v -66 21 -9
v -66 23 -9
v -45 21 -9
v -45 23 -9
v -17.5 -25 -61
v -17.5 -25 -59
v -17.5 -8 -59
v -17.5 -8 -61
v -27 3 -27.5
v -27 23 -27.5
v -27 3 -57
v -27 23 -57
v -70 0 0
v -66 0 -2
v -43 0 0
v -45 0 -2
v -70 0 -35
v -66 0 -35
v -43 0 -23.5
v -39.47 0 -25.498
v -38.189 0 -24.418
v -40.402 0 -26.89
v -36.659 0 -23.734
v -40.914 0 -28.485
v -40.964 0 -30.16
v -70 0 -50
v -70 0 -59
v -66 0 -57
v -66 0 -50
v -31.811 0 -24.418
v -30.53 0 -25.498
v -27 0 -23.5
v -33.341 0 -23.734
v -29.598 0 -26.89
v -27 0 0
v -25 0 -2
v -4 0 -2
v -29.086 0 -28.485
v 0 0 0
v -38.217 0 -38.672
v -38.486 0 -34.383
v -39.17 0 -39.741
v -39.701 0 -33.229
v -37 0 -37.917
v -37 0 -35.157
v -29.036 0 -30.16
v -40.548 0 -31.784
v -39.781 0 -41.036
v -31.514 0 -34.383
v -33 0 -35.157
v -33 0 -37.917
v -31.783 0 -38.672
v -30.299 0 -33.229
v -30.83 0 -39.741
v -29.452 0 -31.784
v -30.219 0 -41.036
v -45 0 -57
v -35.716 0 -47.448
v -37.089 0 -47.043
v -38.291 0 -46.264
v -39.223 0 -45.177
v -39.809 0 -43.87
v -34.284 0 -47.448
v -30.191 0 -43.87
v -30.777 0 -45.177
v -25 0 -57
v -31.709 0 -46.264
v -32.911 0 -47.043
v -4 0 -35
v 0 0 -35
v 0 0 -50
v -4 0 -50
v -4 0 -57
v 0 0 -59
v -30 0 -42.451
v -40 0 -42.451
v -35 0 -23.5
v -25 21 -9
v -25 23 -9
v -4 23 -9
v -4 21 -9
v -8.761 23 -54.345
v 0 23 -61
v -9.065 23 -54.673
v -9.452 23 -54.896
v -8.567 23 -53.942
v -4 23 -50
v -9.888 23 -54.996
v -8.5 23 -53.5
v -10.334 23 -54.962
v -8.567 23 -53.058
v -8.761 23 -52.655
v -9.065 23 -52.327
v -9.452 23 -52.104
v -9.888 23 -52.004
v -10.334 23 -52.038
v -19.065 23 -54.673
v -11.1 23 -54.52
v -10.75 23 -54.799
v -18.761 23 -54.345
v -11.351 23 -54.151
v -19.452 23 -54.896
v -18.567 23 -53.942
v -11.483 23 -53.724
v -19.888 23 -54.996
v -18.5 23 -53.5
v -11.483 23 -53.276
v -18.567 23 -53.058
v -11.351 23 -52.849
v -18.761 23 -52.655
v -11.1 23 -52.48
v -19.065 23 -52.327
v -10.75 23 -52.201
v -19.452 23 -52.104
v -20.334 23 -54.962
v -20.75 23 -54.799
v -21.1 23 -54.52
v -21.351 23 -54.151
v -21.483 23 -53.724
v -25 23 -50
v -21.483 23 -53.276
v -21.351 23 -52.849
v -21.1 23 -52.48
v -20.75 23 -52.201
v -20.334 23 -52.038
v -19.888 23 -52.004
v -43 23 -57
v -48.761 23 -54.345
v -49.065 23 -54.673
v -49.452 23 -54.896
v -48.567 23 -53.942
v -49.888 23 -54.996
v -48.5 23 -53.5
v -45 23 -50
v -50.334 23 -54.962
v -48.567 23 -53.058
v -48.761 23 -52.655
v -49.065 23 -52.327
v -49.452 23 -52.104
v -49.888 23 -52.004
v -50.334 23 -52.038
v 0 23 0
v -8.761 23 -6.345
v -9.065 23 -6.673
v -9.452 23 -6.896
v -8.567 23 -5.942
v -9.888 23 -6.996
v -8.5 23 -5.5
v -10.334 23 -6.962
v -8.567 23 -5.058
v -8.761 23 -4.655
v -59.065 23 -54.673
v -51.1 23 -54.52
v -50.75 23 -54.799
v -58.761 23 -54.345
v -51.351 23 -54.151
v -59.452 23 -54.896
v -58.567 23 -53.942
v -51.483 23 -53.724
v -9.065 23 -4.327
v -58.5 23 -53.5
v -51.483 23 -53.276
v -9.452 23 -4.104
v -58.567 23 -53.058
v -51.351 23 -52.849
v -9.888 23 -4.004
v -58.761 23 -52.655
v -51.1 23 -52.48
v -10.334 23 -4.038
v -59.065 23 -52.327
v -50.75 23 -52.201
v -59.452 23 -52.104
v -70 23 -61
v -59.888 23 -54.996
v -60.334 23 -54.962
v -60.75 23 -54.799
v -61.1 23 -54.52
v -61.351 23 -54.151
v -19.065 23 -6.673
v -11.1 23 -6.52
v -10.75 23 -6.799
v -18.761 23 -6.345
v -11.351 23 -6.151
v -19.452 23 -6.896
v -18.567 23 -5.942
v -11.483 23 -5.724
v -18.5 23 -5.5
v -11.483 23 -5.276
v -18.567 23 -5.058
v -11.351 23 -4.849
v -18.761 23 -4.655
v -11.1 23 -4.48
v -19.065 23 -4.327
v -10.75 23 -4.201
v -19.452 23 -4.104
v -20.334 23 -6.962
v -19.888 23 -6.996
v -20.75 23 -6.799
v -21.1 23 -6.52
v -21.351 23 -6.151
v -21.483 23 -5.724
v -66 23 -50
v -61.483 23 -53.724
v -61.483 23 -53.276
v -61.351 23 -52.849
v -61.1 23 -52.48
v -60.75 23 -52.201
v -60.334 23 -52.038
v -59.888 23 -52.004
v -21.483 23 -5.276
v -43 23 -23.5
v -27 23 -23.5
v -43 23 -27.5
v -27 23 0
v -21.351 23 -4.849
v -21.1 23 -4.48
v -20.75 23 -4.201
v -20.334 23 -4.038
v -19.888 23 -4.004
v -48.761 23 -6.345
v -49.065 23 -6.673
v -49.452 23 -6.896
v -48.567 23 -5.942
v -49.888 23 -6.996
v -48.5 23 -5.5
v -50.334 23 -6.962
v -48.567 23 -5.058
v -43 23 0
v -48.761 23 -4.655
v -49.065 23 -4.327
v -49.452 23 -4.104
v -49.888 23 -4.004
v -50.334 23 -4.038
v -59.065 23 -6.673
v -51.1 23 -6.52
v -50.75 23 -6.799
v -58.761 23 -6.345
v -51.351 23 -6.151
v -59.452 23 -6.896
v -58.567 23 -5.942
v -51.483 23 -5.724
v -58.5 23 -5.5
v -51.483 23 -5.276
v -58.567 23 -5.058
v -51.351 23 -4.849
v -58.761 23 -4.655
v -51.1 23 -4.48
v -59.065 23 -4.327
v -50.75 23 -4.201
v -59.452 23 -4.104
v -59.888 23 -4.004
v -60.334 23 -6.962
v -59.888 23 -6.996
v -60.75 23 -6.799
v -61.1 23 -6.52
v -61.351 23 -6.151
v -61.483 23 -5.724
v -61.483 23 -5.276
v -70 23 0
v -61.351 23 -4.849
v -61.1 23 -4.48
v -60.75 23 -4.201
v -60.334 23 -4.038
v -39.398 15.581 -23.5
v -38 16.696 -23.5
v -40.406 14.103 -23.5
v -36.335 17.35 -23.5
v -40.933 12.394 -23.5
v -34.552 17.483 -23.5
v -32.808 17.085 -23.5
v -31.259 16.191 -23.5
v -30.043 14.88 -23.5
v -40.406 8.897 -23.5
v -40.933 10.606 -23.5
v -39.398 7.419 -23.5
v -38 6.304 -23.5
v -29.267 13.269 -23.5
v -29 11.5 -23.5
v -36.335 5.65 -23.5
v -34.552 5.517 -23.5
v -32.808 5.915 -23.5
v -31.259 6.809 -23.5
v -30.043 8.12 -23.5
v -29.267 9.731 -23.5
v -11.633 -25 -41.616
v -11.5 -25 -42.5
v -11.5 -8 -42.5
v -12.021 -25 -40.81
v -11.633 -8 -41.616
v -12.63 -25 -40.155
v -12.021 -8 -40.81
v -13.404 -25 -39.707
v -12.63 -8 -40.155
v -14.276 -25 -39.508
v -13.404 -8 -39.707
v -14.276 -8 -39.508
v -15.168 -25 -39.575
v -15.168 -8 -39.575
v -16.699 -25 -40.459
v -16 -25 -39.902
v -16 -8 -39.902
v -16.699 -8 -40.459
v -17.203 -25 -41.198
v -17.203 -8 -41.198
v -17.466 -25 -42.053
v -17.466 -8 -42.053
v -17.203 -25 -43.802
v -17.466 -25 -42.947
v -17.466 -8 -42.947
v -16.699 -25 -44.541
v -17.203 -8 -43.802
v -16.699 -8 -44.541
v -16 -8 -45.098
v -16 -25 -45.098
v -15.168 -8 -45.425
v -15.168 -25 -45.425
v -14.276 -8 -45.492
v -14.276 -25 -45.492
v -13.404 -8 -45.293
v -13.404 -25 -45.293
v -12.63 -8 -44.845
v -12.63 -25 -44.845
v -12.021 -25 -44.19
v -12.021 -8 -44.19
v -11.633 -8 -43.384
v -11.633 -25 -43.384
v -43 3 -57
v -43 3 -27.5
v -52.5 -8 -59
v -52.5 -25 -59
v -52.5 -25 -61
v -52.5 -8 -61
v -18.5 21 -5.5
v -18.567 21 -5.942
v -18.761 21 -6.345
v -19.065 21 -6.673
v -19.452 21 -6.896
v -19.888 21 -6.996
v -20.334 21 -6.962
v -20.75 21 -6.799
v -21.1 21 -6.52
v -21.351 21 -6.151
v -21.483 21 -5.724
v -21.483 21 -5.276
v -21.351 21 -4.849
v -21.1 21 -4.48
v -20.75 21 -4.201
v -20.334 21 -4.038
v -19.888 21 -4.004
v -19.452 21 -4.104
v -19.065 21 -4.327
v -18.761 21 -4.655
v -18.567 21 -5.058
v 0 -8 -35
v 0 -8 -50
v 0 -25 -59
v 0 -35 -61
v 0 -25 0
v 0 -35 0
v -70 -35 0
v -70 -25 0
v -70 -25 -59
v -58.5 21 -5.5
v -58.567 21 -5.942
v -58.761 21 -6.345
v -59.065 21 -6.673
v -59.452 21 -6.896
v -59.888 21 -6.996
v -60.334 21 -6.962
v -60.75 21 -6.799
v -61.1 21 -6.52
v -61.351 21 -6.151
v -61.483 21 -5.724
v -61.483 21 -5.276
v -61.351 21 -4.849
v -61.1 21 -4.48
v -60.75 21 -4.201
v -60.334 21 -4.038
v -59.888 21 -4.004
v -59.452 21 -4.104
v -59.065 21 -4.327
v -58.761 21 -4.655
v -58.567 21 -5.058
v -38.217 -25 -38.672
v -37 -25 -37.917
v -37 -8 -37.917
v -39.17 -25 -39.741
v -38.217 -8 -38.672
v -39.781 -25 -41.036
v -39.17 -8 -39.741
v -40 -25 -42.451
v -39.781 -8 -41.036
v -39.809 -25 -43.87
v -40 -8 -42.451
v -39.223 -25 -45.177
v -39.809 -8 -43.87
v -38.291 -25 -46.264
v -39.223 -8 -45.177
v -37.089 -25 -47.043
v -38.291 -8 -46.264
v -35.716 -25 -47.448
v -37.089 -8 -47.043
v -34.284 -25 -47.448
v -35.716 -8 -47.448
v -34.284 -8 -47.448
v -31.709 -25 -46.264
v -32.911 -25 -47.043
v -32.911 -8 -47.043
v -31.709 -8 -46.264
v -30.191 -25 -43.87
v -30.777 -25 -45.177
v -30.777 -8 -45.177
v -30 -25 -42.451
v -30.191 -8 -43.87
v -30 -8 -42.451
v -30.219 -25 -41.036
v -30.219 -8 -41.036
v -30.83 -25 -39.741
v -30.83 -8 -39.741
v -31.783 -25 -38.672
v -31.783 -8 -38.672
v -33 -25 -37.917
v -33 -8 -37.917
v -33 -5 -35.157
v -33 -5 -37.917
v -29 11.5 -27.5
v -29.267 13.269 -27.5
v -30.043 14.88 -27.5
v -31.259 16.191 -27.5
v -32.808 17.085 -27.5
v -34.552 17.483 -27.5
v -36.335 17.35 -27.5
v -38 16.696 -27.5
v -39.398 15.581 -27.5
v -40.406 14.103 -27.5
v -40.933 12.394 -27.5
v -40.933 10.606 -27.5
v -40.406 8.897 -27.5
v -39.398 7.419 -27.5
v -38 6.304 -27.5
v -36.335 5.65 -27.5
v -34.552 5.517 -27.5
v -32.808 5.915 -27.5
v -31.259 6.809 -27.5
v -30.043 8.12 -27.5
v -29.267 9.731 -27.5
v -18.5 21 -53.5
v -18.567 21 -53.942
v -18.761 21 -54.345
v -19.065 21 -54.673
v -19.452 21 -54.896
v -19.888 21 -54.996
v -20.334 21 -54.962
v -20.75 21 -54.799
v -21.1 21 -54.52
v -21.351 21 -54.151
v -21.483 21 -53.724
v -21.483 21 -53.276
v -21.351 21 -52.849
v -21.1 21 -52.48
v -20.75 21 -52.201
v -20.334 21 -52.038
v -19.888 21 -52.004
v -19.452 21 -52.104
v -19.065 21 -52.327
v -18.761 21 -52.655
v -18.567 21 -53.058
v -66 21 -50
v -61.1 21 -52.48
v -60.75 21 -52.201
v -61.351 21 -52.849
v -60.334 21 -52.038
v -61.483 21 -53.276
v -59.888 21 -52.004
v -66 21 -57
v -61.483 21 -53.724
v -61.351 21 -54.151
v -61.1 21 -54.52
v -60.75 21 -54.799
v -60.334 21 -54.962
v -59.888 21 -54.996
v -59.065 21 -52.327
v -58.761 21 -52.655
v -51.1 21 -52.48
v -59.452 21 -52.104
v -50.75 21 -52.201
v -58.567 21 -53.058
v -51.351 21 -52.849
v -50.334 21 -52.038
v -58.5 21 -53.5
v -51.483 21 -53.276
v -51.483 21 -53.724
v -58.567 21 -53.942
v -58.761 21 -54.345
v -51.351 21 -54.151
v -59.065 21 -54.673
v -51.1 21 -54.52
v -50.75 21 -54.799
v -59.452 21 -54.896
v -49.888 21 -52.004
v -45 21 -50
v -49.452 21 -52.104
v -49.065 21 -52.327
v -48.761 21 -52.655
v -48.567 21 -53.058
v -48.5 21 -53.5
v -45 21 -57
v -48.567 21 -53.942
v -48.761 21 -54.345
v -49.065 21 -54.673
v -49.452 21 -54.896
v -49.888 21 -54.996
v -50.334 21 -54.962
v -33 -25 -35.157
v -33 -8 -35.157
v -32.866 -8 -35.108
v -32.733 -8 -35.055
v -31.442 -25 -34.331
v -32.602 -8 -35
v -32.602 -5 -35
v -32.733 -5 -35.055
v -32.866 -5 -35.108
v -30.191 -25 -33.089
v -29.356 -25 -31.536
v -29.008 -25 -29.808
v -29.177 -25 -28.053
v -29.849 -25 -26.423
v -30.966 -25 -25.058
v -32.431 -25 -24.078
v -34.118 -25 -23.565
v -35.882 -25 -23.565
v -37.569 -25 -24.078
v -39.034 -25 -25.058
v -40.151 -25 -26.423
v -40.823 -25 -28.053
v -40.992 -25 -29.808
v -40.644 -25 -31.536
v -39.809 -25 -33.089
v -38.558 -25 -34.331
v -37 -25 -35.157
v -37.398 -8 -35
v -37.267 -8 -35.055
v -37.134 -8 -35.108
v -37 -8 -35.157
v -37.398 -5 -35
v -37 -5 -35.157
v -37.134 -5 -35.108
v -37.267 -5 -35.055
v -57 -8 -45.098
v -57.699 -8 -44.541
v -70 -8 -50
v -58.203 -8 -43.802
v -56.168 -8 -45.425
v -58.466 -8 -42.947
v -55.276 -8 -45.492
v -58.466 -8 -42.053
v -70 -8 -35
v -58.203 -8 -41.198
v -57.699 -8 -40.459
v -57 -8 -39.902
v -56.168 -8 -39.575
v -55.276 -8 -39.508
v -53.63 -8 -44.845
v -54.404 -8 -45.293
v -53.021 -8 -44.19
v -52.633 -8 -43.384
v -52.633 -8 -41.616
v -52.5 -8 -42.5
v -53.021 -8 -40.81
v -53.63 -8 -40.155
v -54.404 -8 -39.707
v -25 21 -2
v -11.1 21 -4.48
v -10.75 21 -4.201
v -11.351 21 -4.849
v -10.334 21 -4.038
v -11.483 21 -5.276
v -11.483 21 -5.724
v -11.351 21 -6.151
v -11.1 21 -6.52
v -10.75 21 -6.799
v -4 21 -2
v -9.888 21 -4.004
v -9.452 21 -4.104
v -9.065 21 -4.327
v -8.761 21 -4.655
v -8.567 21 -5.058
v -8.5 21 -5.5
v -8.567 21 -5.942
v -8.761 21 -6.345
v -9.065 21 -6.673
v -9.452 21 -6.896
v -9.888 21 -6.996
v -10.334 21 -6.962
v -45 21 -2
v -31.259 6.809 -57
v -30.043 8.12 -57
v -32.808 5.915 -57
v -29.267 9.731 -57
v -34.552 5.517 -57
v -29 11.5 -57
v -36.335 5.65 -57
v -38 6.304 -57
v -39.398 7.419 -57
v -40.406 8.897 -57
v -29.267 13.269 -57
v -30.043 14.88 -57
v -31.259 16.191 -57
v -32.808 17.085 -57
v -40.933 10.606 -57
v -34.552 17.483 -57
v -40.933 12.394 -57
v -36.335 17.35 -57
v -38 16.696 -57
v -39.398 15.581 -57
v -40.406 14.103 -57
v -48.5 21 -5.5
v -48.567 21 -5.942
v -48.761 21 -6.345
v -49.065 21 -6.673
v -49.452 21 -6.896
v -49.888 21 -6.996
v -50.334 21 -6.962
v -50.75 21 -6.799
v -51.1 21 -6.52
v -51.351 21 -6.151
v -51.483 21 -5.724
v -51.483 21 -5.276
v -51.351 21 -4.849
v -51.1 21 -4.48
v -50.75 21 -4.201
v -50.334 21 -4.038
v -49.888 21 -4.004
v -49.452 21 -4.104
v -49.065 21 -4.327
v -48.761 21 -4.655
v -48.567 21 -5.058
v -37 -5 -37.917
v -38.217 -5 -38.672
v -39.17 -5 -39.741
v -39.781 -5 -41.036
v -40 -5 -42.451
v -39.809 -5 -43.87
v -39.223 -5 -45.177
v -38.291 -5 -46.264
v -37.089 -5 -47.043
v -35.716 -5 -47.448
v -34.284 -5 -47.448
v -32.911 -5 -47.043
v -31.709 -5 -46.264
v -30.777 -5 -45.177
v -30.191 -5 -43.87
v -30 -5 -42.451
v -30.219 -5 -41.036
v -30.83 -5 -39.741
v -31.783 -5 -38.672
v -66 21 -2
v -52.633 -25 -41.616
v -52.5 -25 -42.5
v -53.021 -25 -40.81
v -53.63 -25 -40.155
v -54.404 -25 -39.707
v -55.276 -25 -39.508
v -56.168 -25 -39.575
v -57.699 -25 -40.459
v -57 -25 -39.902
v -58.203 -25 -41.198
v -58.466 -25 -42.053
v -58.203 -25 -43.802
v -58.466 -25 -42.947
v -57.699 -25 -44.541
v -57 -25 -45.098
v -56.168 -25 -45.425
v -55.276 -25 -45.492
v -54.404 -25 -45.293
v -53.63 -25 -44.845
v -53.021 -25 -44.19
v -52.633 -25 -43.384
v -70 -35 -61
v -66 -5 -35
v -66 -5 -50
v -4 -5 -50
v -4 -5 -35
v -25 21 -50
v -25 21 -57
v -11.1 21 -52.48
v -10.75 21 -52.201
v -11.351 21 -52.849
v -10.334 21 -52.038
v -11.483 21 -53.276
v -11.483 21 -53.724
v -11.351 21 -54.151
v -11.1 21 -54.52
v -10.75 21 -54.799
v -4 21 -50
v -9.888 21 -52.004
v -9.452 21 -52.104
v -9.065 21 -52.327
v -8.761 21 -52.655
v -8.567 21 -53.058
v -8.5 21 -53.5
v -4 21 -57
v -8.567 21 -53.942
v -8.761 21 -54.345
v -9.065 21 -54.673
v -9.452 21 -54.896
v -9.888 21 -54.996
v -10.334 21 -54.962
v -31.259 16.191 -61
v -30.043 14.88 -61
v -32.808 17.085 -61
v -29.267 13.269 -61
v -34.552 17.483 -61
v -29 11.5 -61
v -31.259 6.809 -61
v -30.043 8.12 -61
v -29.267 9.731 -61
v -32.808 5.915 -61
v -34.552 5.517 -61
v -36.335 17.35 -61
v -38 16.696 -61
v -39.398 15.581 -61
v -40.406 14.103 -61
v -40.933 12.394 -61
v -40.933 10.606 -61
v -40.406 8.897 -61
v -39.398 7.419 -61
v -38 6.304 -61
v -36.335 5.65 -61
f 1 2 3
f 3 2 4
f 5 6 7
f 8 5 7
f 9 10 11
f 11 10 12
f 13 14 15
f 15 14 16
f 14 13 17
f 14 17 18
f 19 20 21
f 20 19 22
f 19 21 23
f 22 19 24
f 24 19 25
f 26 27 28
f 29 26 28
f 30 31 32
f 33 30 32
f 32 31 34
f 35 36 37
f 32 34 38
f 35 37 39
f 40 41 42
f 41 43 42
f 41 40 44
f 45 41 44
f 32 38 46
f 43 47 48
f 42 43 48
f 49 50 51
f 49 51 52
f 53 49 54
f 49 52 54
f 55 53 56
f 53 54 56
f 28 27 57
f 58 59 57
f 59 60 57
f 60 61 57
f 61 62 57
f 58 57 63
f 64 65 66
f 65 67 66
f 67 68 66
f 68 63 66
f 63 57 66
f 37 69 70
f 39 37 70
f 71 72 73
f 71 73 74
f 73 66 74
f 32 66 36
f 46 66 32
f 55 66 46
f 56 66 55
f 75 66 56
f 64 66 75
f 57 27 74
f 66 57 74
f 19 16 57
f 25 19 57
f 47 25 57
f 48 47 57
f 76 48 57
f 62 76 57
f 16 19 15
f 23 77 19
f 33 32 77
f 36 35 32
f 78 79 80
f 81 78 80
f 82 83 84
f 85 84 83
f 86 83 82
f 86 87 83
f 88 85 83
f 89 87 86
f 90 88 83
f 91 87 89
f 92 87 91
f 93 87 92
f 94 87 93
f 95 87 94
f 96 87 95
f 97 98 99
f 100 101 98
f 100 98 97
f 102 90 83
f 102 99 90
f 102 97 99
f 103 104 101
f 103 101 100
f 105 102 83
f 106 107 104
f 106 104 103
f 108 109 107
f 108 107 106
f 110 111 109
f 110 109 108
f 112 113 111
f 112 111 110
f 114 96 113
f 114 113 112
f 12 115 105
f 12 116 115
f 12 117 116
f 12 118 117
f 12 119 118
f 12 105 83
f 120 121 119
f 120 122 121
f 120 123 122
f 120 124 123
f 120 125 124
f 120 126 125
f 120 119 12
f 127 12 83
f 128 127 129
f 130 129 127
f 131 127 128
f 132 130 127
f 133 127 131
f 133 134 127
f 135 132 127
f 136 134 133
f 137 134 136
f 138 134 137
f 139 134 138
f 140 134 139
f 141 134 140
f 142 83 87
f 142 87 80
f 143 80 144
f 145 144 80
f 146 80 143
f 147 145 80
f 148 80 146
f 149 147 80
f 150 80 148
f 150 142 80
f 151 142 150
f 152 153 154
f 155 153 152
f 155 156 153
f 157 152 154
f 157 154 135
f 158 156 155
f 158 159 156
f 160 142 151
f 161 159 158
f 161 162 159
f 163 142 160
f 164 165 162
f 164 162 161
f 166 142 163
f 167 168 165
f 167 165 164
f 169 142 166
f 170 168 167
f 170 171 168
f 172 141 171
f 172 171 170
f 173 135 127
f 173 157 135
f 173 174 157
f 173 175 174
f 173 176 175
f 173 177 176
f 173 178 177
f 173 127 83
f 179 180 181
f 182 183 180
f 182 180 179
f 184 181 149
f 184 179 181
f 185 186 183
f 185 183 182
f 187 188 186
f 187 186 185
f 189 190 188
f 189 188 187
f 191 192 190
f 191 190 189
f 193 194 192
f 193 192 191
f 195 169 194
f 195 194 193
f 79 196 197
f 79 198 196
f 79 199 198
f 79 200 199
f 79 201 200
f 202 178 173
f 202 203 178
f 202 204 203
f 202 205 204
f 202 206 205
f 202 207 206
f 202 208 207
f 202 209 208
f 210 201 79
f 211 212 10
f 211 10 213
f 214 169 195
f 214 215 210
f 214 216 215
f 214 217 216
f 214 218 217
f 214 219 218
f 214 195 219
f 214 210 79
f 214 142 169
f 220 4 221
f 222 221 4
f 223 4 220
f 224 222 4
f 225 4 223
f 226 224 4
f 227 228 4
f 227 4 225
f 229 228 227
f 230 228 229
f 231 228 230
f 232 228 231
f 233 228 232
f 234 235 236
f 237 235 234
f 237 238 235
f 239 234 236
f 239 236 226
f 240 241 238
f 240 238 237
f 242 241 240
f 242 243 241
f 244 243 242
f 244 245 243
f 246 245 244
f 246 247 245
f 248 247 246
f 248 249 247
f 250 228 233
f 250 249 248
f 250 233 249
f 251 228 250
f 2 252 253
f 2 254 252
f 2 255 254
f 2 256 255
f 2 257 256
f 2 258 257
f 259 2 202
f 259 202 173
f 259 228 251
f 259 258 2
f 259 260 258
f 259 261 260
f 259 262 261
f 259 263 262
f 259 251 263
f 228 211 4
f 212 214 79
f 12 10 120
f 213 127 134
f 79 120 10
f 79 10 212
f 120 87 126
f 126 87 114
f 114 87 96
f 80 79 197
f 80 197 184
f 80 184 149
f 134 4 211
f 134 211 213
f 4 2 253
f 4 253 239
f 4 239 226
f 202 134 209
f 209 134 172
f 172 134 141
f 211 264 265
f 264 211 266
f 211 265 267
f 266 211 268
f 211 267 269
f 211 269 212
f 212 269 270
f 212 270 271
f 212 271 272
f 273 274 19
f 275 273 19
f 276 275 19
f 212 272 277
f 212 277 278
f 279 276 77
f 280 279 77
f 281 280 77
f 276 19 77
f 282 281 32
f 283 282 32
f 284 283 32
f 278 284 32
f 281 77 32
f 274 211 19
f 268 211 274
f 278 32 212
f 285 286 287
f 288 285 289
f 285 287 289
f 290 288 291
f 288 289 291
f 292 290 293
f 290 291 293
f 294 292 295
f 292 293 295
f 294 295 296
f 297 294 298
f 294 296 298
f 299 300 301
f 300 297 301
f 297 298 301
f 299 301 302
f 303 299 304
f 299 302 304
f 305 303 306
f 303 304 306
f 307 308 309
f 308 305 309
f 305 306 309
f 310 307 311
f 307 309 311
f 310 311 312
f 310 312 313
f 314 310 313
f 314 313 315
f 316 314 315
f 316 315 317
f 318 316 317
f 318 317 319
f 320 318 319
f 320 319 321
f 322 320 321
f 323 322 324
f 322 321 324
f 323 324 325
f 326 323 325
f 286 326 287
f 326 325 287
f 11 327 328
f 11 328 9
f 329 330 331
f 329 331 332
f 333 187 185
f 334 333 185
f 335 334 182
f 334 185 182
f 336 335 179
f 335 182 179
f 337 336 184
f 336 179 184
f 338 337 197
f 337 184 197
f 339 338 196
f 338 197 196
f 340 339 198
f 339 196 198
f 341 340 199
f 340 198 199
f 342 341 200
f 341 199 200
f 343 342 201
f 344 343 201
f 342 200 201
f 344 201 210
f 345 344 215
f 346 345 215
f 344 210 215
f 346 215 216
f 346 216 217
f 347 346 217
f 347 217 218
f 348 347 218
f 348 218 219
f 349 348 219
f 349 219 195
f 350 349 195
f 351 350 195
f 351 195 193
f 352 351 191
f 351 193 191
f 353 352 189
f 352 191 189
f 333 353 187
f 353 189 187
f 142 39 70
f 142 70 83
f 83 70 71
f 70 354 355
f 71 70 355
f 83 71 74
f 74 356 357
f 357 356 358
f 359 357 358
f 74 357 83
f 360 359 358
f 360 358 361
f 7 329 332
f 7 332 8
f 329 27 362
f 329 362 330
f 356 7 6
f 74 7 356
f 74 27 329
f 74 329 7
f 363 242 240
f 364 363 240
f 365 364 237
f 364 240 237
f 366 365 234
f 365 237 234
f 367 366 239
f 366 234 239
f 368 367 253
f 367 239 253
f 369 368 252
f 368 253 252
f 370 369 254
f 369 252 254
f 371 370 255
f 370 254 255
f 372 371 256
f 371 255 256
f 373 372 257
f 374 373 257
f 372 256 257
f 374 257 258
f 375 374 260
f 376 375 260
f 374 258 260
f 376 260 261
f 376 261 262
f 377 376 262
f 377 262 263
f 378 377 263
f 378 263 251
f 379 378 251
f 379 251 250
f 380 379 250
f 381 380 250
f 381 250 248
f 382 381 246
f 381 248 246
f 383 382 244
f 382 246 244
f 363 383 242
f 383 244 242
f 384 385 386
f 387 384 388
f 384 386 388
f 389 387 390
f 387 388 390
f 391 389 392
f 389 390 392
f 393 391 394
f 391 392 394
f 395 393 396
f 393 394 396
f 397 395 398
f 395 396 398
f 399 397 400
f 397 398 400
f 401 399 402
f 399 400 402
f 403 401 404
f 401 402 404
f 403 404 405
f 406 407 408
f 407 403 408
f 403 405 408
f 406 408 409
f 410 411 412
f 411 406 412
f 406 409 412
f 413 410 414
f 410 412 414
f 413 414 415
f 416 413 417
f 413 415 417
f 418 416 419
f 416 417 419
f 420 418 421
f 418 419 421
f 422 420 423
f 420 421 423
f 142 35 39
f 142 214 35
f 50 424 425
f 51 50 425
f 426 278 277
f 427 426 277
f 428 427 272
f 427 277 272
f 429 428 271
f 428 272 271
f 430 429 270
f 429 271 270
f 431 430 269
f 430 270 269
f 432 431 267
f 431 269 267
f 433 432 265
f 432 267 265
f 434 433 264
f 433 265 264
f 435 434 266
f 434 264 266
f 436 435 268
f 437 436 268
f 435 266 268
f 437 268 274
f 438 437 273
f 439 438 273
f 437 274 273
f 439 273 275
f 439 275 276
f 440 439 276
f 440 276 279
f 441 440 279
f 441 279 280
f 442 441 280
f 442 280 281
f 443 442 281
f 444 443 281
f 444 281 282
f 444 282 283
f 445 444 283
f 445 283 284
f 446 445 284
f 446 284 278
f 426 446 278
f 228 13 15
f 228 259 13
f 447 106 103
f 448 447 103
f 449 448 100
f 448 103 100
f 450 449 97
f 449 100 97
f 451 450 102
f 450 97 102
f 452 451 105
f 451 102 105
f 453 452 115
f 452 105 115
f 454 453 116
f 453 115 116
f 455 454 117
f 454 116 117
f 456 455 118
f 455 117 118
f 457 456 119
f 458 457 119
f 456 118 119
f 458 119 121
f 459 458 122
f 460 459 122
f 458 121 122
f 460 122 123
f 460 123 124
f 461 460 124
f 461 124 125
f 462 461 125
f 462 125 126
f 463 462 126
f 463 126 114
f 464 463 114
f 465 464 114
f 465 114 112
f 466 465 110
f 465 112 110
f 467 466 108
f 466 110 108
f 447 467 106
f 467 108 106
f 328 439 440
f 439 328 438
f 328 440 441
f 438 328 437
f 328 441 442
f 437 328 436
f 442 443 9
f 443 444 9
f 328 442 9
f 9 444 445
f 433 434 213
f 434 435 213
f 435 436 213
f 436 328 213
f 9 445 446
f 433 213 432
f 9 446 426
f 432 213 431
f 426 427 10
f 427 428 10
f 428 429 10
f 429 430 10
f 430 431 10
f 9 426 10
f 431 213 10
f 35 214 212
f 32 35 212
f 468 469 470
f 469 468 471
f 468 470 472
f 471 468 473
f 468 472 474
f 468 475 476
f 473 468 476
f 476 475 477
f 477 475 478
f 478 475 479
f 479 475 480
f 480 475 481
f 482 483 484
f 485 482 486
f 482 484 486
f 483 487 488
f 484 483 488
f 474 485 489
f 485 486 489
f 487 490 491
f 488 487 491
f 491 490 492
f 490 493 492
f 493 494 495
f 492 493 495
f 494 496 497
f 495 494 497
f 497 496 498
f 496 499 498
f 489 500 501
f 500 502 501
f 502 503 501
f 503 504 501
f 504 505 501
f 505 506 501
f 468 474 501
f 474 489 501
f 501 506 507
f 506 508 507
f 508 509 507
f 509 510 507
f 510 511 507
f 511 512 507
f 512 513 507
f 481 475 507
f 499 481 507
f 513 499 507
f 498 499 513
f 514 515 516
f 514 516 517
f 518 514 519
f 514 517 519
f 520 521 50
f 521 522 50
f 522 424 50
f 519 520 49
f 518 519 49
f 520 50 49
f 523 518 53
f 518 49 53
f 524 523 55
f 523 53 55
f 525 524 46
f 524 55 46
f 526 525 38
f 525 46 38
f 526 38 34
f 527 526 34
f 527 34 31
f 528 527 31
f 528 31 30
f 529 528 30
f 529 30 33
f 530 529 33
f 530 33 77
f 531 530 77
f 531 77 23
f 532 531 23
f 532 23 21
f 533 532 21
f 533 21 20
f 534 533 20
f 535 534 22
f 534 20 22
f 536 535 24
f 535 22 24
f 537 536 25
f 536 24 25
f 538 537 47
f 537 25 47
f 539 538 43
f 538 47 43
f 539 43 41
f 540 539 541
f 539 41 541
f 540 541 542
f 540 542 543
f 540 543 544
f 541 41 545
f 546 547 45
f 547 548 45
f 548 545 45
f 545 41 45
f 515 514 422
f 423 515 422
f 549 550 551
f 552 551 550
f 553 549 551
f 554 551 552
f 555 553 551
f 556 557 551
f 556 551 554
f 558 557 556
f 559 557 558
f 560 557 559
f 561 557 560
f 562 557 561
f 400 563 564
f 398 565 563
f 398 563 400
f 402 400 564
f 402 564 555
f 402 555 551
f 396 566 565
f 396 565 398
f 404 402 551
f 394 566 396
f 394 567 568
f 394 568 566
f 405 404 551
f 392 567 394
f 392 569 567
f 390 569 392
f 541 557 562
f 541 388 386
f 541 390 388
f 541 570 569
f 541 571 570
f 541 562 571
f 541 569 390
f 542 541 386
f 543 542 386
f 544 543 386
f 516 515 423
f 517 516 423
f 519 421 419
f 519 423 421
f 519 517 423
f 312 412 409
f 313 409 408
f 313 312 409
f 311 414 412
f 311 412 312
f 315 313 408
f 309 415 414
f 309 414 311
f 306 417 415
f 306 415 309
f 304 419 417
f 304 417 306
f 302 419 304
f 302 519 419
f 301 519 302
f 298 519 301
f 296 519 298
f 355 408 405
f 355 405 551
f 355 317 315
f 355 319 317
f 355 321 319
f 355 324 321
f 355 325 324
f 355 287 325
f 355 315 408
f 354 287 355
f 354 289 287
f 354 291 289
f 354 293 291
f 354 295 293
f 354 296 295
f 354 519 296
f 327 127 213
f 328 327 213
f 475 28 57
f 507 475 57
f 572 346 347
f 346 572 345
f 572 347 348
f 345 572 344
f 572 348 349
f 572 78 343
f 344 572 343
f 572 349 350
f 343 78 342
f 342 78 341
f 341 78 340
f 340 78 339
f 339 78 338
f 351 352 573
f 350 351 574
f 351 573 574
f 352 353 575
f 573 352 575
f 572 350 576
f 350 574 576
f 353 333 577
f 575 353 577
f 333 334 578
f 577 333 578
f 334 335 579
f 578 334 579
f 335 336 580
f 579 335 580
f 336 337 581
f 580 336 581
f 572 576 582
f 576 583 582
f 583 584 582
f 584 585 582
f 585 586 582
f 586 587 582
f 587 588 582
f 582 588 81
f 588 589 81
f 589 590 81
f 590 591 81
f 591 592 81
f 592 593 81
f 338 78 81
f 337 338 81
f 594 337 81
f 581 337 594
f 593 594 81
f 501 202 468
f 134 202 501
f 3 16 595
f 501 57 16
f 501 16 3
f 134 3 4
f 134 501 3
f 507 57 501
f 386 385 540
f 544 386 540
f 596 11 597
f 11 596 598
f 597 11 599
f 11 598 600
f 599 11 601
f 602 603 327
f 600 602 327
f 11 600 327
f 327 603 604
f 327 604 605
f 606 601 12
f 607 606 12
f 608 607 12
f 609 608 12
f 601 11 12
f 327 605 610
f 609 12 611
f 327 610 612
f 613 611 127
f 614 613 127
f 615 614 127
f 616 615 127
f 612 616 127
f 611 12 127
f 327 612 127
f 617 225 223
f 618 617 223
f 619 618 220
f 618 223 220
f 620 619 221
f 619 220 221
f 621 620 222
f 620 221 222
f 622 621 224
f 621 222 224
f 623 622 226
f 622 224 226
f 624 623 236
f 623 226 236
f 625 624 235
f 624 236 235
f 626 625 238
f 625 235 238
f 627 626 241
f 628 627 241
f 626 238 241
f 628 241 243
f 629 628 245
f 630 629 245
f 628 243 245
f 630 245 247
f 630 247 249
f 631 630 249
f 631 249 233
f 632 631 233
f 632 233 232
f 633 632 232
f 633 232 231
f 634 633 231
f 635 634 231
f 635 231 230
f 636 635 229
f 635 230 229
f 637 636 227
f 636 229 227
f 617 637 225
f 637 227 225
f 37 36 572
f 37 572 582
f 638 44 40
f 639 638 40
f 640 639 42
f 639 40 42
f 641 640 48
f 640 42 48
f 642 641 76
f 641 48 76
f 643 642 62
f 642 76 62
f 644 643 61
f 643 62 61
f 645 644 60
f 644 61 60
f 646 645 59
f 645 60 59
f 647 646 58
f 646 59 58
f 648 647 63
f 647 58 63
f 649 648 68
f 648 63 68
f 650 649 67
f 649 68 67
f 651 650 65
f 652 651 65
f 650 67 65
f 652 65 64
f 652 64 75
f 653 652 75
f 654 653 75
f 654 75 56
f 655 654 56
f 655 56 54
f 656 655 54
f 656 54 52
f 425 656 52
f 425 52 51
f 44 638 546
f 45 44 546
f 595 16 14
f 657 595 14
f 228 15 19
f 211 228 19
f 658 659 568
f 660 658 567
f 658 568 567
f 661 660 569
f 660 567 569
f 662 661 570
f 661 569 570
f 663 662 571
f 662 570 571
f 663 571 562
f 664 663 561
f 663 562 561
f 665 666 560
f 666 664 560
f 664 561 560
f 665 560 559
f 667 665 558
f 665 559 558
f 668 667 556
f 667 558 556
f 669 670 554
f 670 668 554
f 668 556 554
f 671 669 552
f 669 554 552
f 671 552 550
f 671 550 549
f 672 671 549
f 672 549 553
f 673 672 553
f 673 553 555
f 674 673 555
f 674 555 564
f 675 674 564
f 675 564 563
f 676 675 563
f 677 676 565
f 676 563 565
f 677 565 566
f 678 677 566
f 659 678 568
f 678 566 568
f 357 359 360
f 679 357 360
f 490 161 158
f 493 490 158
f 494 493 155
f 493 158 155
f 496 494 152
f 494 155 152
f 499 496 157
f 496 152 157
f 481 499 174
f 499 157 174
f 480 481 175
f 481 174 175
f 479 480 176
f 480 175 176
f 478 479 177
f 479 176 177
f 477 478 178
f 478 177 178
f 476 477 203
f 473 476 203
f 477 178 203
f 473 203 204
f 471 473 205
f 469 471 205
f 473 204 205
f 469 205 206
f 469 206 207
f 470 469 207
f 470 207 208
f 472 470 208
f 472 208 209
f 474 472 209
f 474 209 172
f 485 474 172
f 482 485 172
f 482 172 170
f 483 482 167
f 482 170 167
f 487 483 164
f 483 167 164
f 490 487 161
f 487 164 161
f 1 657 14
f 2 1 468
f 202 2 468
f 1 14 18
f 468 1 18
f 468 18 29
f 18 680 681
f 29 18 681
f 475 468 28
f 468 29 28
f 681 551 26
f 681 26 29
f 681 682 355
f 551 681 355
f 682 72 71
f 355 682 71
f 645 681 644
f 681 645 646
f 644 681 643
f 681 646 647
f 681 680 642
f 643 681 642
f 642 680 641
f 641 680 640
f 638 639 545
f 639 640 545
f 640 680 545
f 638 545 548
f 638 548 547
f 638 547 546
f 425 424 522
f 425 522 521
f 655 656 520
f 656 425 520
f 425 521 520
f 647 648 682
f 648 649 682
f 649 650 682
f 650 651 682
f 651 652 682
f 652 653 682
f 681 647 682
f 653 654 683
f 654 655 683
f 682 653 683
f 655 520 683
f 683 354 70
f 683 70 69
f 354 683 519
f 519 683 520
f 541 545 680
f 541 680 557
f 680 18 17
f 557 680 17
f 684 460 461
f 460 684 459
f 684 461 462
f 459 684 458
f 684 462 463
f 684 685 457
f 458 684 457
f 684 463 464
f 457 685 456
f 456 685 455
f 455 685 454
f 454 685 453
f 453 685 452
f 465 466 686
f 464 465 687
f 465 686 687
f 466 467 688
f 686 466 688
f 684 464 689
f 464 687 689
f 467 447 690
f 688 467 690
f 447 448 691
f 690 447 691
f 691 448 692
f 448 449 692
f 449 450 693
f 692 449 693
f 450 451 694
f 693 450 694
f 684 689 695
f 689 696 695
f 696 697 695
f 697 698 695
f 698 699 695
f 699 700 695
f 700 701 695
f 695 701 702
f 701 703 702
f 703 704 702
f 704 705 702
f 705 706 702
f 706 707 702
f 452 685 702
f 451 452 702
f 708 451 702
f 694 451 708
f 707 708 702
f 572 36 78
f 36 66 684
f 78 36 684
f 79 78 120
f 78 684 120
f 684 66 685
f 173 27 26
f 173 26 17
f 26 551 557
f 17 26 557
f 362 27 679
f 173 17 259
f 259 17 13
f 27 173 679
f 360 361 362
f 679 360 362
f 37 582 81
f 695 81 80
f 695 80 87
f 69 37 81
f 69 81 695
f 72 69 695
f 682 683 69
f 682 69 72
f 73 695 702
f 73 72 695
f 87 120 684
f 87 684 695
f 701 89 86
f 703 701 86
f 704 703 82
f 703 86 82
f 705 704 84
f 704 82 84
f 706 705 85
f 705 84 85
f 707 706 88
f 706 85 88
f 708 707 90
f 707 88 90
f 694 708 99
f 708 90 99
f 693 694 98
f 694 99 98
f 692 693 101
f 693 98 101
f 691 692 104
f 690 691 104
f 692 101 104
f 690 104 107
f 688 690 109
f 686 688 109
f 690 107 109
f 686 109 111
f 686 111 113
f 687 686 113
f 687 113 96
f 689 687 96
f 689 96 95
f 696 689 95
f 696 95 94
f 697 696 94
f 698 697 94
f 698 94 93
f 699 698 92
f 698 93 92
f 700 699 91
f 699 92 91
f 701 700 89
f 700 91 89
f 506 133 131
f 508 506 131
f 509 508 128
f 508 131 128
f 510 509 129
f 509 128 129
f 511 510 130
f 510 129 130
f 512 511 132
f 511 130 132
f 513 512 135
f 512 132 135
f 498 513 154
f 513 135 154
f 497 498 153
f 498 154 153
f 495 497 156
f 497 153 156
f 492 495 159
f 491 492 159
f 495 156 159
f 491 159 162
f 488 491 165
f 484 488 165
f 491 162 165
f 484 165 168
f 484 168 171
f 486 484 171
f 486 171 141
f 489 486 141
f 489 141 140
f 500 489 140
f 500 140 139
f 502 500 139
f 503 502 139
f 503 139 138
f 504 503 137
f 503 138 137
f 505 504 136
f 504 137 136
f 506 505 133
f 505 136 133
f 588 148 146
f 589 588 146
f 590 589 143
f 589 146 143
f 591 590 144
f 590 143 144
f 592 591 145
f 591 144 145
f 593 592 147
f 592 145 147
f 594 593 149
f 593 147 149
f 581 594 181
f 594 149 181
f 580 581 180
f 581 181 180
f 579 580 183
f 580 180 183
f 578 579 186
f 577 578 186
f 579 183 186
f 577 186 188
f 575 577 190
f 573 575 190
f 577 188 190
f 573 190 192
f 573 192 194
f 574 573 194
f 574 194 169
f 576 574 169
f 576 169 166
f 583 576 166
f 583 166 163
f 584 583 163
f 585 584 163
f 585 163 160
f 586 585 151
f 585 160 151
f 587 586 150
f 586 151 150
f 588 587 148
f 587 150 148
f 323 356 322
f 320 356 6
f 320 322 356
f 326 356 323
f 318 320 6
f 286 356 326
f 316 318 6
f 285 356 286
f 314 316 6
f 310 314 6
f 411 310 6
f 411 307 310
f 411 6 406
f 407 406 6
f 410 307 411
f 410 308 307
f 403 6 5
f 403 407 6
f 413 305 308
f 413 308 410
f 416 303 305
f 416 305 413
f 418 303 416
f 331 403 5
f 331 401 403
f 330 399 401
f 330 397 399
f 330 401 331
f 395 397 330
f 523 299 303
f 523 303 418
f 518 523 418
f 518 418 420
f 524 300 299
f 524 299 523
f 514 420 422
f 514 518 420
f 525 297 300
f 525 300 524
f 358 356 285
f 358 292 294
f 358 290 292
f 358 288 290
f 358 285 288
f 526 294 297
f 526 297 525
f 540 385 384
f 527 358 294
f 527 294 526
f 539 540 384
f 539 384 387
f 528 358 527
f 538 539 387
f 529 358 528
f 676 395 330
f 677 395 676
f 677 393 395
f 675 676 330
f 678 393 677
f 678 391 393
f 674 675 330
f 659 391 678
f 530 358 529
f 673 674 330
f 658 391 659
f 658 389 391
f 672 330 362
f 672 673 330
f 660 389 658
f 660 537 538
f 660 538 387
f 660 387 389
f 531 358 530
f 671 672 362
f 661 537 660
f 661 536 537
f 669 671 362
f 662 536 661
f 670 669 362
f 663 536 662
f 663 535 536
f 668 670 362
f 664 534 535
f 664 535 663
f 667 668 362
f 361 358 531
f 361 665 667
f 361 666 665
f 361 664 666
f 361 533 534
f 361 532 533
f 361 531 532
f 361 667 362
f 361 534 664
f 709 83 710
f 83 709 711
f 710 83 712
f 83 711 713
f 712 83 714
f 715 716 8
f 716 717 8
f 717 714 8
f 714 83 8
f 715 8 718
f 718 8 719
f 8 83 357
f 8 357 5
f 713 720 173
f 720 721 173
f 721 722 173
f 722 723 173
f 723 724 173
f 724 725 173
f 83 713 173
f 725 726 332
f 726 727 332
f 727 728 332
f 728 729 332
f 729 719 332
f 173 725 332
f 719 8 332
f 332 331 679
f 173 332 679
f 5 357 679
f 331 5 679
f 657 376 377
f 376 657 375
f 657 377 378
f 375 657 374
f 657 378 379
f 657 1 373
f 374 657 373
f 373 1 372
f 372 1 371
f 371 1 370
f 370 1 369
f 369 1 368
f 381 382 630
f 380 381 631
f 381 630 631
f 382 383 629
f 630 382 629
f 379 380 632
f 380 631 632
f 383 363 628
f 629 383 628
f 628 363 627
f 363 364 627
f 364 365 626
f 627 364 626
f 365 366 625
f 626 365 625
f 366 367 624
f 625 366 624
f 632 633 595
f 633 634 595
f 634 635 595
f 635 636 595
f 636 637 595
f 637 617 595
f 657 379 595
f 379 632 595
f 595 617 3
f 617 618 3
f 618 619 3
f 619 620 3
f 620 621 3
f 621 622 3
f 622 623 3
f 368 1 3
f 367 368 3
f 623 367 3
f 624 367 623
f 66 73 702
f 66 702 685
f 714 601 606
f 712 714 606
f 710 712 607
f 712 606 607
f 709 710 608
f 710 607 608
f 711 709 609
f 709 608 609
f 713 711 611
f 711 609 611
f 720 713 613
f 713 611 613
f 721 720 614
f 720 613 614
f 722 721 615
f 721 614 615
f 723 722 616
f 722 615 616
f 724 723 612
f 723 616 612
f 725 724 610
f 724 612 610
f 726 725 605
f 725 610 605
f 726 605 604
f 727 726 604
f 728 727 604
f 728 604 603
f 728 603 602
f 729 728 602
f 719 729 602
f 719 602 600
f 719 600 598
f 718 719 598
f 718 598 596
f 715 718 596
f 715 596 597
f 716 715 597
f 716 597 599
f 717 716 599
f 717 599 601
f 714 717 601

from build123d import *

# Parameters (mm, degrees)
EXTRUDE_1_DEPTH     = 23
EXTRUDE_1_2_DEPTH   = 23
SKETCH_2_W          = 21
SKETCH_2_H          = 9
EXTRUDE_2_DEPTH     = 2
SKETCH_3_R          = 1.5
CUT_EXTRUDE_1_DEPTH = 2
SKETCH_4_W          = 4.5
SKETCH_4_H          = 23
EXTRUDE_3_DEPTH     = 20
SKETCH_5_W          = 20
SKETCH_5_H          = 23
EXTRUDE_4_DEPTH     = 54.5
SKETCH_7_R          = 6
EXTRUDE_5_DEPTH     = 35
SKETCH_8_W          = 4
SKETCH_8_H          = 15
EXTRUDE_6_DEPTH     = 5
EXTRUDE_7_DEPTH     = 3
SKETCH_10_R         = 5
EXTRUDE_8_DEPTH     = 35
EXTRUDE_9_DEPTH     = 35
SKETCH_12_R         = 3
EXTRUDE_10_DEPTH    = 27
CUT_EXTRUDE_2_DEPTH = 27
CUT_EXTRUDE_3_DEPTH = 20
EXTRUDE_11_DEPTH    = 2
SKETCH_16_W         = 35
SKETCH_16_H         = 27
CUT_EXTRUDE_5_DEPTH = 2
SKETCH_18_W         = 16
SKETCH_18_H         = 2
CUT_EXTRUDE_7_DEPTH = 30
SKETCH_19_R         = 3
CUT_EXTRUDE_8_DEPTH = 50
EXTRUDE_12_DEPTH    = 10
SKETCH_21_R         = 6
CUT_EXTRUDE_9_DEPTH = 60


with BuildPart() as part:
    # 스케치1 → 보스-돌출1 (new body)
    with BuildSketch(Plane(origin=(0, 0, 0), x_dir=(1, 0, 0), z_dir=(0, 1, 0))):
        Polygon((-66, 57), (-45, 57), (-45, 59), (-70, 59), (-70, 0), (-45, 0), (-45, 2), (-66, 2), align=None)
    extrude(amount=EXTRUDE_1_DEPTH)



with BuildPart() as body_2:
    # 스케치1 → Extrude 1 2 (new body)
    with BuildSketch(Plane(origin=(0, 0, 0), x_dir=(1, 0, 0), z_dir=(0, 1, 0))):
        Polygon((-25, 2), (-4, 2), (-4, 57), (-25, 57), (-25, 59), (0, 59), (0, 0), (-25, 0), align=None)
    extrude(amount=EXTRUDE_1_2_DEPTH)


with BuildPart() as part_1:
    add(part.part)

    add(body_2.part)  # 보스-돌출2 merges body 2
    # 스케치2 → 보스-돌출2 (add)
    with BuildSketch(Plane(origin=(0, 23, 0), x_dir=(1, 0, 0), z_dir=(0, 1, 0))):
        with Locations((-55.5, 54.5)):
            Rectangle(SKETCH_2_W, SKETCH_2_H)
        with Locations((-14.5, 54.5)):
            Rectangle(SKETCH_2_W, SKETCH_2_H)
        with Locations((-55.5, 4.5)):
            Rectangle(SKETCH_2_W, SKETCH_2_H)
        with Locations((-14.5, 4.5)):
            Rectangle(SKETCH_2_W, SKETCH_2_H)
    extrude(amount=-EXTRUDE_2_DEPTH)

    # 스케치3 → 컷-돌출1 (cut)
    with BuildSketch(Plane(origin=(0, 23, 0), x_dir=(1, 0, 0), z_dir=(0, 1, 0))):
        with Locations((-50, 53.5)):
            Circle(SKETCH_3_R)
        with Locations((-60, 53.5)):
            Circle(SKETCH_3_R)
        with Locations((-20, 53.5)):
            Circle(SKETCH_3_R)
        with Locations((-10, 53.5)):
            Circle(SKETCH_3_R)
        with Locations((-60, 5.5)):
            Circle(SKETCH_3_R)
        with Locations((-50, 5.5)):
            Circle(SKETCH_3_R)
        with Locations((-20, 5.5)):
            Circle(SKETCH_3_R)
        with Locations((-10, 5.5)):
            Circle(SKETCH_3_R)
    extrude(amount=-CUT_EXTRUDE_1_DEPTH, mode=Mode.SUBTRACT)

    # 스케치4 → 보스-돌출3 (add)
    with BuildSketch(Plane.ZY.offset(25)):
        with Locations((-56.75, 11.5)):
            Rectangle(SKETCH_4_W, SKETCH_4_H)
    extrude(amount=EXTRUDE_3_DEPTH)

    # 스케치5 → 보스-돌출4 (add)
    with BuildSketch(Plane.XY.offset(-54.5)):
        with Locations((-35, 11.5)):
            Rectangle(SKETCH_5_W, SKETCH_5_H)
    extrude(amount=EXTRUDE_4_DEPTH)

    # 스케치7 → 보스-돌출5 (add)
    with BuildSketch(Plane.XZ):
        with Locations((-35, -29.5)):
            Circle(SKETCH_7_R)
    extrude(amount=EXTRUDE_5_DEPTH)

    # 스케치8 → 보스-돌출6 (add)
    with BuildSketch(Plane.XZ):
        with Locations((-2, -42.5)):
            Rectangle(SKETCH_8_W, SKETCH_8_H)
        with Locations((-68, -42.5)):
            Rectangle(SKETCH_8_W, SKETCH_8_H)
    extrude(amount=EXTRUDE_6_DEPTH)

    # 스케치9 → 보스-돌출7 (add)
    with BuildSketch(Plane.XZ.offset(5)):
        Polygon((-70, -50), (-45, -50), (0, -50), (0, -35), (-70, -35), align=None)
    extrude(amount=EXTRUDE_7_DEPTH)

    # 스케치10 → 보스-돌출8 (add)
    with BuildSketch(Plane.XZ):
        with Locations((-35, -42.5)):
            Circle(SKETCH_10_R)
    extrude(amount=EXTRUDE_8_DEPTH)

    # 스케치11 → 보스-돌출9 (add)
    with BuildSketch(Plane.XZ.offset(35)):
        Polygon((-35, -29.5), (-33, -29.5), (-33, -42.5), (-37, -42.5), (-37, -29.5), align=None)
    extrude(amount=-EXTRUDE_9_DEPTH)

    # 스케치12 → 보스-돌출10 (add)
    with BuildSketch(Plane.XZ.offset(8)):
        with Locations((-55.5, -42.5)):
            Circle(SKETCH_12_R)
        with Locations((-14.5, -42.5)):
            Circle(SKETCH_12_R)
    extrude(amount=EXTRUDE_10_DEPTH)

    # 스케치13 → 컷-돌출2 (cut)
    with BuildSketch(Plane.XZ):
        Polygon((-35, -23.5), (-27, -23.5), (-27, -2), (-43, -2), (-43, -23.5), align=None)
    extrude(amount=-CUT_EXTRUDE_2_DEPTH, mode=Mode.SUBTRACT)

    # 스케치14 → 컷-돌출3 (cut)
    with BuildSketch(Plane(origin=(0, 23, 0), x_dir=(1, 0, 0), z_dir=(0, 1, 0))):
        Polygon((-27, 57), (-35, 57), (-43, 57), (-43, 27.5), (-35, 27.5), (-27, 27.5), align=None)
    extrude(amount=-CUT_EXTRUDE_3_DEPTH, mode=Mode.SUBTRACT)

    # 스케치15 → 보스-돌출11 (add)
    with BuildSketch(Plane(origin=(0, 0, -59), x_dir=(-1, 0, 0), z_dir=(0, 0, -1))):
        Polygon((0, 0), (0, 23), (70, 23), (70, -35), (0, -35), align=None)
    extrude(amount=EXTRUDE_11_DEPTH)

    # 스케치16 → 컷-돌출5 (cut)
    with BuildSketch(Plane.XY.offset(-59)):
        with Locations((-35, -21.5)):
            Rectangle(SKETCH_16_W, SKETCH_16_H)
    extrude(amount=-CUT_EXTRUDE_5_DEPTH, mode=Mode.SUBTRACT)

    # 스케치18 → 컷-돌출7 (cut)
    with BuildSketch(Plane(origin=(0, 23, 0), x_dir=(1, 0, 0), z_dir=(0, 1, 0))):
        with Locations((-35, 1)):
            Rectangle(SKETCH_18_W, SKETCH_18_H)
    extrude(amount=-CUT_EXTRUDE_7_DEPTH, mode=Mode.SUBTRACT)

    # 스케치19 → 컷-돌출8 (cut)
    with BuildSketch(Plane.XY.offset(-23.5)):
        with Locations((-35, 11.5)):
            Circle(SKETCH_19_R)
    extrude(amount=-CUT_EXTRUDE_8_DEPTH, mode=Mode.SUBTRACT)

    # 스케치20 → 보스-돌출12 (add)
    with BuildSketch(Plane.XZ.offset(35)):
        Polygon((-35, 0), (0, 0), (0, -61), (-70, -61), (-70, 0), align=None)
    extrude(amount=-EXTRUDE_12_DEPTH)

    # 스케치21 → 컷-돌출9 (cut)
    with BuildSketch(Plane.XY.offset(-23.5)):
        with Locations((-35, 11.5)):
            Circle(SKETCH_21_R)
    extrude(amount=-CUT_EXTRUDE_9_DEPTH, mode=Mode.SUBTRACT)


solid = part_1.part
